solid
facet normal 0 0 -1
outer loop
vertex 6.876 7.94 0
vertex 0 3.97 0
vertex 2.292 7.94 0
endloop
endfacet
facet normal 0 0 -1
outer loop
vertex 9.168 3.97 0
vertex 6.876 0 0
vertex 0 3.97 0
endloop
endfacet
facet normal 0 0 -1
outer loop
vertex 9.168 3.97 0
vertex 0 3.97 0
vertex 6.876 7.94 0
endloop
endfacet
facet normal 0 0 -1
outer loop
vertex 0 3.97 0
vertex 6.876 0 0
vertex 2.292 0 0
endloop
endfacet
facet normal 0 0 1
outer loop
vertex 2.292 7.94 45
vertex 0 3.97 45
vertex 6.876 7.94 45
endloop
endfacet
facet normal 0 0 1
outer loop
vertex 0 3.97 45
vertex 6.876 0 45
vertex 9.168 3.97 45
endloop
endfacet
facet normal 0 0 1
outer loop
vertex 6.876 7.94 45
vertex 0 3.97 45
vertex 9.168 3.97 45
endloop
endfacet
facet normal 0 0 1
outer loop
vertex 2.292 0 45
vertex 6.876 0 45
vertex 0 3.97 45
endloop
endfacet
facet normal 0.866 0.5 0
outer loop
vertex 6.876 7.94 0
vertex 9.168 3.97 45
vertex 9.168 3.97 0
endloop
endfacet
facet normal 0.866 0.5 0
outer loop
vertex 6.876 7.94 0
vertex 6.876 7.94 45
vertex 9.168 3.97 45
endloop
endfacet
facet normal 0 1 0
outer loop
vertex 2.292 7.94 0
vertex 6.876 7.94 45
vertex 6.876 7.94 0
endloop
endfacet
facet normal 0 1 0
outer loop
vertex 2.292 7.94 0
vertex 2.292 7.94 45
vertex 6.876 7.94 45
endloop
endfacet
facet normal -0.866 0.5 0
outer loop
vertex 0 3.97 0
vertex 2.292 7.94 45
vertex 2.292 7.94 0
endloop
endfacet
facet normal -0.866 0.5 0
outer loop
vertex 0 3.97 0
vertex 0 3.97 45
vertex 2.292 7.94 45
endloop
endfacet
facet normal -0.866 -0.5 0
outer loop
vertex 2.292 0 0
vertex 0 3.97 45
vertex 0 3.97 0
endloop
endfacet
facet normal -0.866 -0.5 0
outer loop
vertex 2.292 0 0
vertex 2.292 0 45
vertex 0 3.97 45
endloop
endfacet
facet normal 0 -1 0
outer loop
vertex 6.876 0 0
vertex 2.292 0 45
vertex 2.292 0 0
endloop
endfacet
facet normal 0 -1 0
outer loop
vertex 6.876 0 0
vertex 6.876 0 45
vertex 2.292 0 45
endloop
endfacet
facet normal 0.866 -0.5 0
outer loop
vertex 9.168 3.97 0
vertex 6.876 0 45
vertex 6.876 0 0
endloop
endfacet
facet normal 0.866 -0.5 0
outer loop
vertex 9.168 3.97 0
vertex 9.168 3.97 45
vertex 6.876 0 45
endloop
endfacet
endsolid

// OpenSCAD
$fn = 32;

// ----------------------------------------------------------------------
// Key bar: hex key, 45 mm thick
// ----------------------------------------------------------------------

// --- parameters (mm) ---
profile_height = 45;      // extrusion height
profile_points = 6;       // points of the closed outline

profile = [[9.168, 3.97], [6.876, 7.94], [2.292, 7.94], [0, 3.97], [2.292, 0], [6.876, 0]];  // single closed polygon, 6 points, counter clockwise

// --- the one profile operation ---
linear_extrude(height = profile_height) polygon(points = profile);
